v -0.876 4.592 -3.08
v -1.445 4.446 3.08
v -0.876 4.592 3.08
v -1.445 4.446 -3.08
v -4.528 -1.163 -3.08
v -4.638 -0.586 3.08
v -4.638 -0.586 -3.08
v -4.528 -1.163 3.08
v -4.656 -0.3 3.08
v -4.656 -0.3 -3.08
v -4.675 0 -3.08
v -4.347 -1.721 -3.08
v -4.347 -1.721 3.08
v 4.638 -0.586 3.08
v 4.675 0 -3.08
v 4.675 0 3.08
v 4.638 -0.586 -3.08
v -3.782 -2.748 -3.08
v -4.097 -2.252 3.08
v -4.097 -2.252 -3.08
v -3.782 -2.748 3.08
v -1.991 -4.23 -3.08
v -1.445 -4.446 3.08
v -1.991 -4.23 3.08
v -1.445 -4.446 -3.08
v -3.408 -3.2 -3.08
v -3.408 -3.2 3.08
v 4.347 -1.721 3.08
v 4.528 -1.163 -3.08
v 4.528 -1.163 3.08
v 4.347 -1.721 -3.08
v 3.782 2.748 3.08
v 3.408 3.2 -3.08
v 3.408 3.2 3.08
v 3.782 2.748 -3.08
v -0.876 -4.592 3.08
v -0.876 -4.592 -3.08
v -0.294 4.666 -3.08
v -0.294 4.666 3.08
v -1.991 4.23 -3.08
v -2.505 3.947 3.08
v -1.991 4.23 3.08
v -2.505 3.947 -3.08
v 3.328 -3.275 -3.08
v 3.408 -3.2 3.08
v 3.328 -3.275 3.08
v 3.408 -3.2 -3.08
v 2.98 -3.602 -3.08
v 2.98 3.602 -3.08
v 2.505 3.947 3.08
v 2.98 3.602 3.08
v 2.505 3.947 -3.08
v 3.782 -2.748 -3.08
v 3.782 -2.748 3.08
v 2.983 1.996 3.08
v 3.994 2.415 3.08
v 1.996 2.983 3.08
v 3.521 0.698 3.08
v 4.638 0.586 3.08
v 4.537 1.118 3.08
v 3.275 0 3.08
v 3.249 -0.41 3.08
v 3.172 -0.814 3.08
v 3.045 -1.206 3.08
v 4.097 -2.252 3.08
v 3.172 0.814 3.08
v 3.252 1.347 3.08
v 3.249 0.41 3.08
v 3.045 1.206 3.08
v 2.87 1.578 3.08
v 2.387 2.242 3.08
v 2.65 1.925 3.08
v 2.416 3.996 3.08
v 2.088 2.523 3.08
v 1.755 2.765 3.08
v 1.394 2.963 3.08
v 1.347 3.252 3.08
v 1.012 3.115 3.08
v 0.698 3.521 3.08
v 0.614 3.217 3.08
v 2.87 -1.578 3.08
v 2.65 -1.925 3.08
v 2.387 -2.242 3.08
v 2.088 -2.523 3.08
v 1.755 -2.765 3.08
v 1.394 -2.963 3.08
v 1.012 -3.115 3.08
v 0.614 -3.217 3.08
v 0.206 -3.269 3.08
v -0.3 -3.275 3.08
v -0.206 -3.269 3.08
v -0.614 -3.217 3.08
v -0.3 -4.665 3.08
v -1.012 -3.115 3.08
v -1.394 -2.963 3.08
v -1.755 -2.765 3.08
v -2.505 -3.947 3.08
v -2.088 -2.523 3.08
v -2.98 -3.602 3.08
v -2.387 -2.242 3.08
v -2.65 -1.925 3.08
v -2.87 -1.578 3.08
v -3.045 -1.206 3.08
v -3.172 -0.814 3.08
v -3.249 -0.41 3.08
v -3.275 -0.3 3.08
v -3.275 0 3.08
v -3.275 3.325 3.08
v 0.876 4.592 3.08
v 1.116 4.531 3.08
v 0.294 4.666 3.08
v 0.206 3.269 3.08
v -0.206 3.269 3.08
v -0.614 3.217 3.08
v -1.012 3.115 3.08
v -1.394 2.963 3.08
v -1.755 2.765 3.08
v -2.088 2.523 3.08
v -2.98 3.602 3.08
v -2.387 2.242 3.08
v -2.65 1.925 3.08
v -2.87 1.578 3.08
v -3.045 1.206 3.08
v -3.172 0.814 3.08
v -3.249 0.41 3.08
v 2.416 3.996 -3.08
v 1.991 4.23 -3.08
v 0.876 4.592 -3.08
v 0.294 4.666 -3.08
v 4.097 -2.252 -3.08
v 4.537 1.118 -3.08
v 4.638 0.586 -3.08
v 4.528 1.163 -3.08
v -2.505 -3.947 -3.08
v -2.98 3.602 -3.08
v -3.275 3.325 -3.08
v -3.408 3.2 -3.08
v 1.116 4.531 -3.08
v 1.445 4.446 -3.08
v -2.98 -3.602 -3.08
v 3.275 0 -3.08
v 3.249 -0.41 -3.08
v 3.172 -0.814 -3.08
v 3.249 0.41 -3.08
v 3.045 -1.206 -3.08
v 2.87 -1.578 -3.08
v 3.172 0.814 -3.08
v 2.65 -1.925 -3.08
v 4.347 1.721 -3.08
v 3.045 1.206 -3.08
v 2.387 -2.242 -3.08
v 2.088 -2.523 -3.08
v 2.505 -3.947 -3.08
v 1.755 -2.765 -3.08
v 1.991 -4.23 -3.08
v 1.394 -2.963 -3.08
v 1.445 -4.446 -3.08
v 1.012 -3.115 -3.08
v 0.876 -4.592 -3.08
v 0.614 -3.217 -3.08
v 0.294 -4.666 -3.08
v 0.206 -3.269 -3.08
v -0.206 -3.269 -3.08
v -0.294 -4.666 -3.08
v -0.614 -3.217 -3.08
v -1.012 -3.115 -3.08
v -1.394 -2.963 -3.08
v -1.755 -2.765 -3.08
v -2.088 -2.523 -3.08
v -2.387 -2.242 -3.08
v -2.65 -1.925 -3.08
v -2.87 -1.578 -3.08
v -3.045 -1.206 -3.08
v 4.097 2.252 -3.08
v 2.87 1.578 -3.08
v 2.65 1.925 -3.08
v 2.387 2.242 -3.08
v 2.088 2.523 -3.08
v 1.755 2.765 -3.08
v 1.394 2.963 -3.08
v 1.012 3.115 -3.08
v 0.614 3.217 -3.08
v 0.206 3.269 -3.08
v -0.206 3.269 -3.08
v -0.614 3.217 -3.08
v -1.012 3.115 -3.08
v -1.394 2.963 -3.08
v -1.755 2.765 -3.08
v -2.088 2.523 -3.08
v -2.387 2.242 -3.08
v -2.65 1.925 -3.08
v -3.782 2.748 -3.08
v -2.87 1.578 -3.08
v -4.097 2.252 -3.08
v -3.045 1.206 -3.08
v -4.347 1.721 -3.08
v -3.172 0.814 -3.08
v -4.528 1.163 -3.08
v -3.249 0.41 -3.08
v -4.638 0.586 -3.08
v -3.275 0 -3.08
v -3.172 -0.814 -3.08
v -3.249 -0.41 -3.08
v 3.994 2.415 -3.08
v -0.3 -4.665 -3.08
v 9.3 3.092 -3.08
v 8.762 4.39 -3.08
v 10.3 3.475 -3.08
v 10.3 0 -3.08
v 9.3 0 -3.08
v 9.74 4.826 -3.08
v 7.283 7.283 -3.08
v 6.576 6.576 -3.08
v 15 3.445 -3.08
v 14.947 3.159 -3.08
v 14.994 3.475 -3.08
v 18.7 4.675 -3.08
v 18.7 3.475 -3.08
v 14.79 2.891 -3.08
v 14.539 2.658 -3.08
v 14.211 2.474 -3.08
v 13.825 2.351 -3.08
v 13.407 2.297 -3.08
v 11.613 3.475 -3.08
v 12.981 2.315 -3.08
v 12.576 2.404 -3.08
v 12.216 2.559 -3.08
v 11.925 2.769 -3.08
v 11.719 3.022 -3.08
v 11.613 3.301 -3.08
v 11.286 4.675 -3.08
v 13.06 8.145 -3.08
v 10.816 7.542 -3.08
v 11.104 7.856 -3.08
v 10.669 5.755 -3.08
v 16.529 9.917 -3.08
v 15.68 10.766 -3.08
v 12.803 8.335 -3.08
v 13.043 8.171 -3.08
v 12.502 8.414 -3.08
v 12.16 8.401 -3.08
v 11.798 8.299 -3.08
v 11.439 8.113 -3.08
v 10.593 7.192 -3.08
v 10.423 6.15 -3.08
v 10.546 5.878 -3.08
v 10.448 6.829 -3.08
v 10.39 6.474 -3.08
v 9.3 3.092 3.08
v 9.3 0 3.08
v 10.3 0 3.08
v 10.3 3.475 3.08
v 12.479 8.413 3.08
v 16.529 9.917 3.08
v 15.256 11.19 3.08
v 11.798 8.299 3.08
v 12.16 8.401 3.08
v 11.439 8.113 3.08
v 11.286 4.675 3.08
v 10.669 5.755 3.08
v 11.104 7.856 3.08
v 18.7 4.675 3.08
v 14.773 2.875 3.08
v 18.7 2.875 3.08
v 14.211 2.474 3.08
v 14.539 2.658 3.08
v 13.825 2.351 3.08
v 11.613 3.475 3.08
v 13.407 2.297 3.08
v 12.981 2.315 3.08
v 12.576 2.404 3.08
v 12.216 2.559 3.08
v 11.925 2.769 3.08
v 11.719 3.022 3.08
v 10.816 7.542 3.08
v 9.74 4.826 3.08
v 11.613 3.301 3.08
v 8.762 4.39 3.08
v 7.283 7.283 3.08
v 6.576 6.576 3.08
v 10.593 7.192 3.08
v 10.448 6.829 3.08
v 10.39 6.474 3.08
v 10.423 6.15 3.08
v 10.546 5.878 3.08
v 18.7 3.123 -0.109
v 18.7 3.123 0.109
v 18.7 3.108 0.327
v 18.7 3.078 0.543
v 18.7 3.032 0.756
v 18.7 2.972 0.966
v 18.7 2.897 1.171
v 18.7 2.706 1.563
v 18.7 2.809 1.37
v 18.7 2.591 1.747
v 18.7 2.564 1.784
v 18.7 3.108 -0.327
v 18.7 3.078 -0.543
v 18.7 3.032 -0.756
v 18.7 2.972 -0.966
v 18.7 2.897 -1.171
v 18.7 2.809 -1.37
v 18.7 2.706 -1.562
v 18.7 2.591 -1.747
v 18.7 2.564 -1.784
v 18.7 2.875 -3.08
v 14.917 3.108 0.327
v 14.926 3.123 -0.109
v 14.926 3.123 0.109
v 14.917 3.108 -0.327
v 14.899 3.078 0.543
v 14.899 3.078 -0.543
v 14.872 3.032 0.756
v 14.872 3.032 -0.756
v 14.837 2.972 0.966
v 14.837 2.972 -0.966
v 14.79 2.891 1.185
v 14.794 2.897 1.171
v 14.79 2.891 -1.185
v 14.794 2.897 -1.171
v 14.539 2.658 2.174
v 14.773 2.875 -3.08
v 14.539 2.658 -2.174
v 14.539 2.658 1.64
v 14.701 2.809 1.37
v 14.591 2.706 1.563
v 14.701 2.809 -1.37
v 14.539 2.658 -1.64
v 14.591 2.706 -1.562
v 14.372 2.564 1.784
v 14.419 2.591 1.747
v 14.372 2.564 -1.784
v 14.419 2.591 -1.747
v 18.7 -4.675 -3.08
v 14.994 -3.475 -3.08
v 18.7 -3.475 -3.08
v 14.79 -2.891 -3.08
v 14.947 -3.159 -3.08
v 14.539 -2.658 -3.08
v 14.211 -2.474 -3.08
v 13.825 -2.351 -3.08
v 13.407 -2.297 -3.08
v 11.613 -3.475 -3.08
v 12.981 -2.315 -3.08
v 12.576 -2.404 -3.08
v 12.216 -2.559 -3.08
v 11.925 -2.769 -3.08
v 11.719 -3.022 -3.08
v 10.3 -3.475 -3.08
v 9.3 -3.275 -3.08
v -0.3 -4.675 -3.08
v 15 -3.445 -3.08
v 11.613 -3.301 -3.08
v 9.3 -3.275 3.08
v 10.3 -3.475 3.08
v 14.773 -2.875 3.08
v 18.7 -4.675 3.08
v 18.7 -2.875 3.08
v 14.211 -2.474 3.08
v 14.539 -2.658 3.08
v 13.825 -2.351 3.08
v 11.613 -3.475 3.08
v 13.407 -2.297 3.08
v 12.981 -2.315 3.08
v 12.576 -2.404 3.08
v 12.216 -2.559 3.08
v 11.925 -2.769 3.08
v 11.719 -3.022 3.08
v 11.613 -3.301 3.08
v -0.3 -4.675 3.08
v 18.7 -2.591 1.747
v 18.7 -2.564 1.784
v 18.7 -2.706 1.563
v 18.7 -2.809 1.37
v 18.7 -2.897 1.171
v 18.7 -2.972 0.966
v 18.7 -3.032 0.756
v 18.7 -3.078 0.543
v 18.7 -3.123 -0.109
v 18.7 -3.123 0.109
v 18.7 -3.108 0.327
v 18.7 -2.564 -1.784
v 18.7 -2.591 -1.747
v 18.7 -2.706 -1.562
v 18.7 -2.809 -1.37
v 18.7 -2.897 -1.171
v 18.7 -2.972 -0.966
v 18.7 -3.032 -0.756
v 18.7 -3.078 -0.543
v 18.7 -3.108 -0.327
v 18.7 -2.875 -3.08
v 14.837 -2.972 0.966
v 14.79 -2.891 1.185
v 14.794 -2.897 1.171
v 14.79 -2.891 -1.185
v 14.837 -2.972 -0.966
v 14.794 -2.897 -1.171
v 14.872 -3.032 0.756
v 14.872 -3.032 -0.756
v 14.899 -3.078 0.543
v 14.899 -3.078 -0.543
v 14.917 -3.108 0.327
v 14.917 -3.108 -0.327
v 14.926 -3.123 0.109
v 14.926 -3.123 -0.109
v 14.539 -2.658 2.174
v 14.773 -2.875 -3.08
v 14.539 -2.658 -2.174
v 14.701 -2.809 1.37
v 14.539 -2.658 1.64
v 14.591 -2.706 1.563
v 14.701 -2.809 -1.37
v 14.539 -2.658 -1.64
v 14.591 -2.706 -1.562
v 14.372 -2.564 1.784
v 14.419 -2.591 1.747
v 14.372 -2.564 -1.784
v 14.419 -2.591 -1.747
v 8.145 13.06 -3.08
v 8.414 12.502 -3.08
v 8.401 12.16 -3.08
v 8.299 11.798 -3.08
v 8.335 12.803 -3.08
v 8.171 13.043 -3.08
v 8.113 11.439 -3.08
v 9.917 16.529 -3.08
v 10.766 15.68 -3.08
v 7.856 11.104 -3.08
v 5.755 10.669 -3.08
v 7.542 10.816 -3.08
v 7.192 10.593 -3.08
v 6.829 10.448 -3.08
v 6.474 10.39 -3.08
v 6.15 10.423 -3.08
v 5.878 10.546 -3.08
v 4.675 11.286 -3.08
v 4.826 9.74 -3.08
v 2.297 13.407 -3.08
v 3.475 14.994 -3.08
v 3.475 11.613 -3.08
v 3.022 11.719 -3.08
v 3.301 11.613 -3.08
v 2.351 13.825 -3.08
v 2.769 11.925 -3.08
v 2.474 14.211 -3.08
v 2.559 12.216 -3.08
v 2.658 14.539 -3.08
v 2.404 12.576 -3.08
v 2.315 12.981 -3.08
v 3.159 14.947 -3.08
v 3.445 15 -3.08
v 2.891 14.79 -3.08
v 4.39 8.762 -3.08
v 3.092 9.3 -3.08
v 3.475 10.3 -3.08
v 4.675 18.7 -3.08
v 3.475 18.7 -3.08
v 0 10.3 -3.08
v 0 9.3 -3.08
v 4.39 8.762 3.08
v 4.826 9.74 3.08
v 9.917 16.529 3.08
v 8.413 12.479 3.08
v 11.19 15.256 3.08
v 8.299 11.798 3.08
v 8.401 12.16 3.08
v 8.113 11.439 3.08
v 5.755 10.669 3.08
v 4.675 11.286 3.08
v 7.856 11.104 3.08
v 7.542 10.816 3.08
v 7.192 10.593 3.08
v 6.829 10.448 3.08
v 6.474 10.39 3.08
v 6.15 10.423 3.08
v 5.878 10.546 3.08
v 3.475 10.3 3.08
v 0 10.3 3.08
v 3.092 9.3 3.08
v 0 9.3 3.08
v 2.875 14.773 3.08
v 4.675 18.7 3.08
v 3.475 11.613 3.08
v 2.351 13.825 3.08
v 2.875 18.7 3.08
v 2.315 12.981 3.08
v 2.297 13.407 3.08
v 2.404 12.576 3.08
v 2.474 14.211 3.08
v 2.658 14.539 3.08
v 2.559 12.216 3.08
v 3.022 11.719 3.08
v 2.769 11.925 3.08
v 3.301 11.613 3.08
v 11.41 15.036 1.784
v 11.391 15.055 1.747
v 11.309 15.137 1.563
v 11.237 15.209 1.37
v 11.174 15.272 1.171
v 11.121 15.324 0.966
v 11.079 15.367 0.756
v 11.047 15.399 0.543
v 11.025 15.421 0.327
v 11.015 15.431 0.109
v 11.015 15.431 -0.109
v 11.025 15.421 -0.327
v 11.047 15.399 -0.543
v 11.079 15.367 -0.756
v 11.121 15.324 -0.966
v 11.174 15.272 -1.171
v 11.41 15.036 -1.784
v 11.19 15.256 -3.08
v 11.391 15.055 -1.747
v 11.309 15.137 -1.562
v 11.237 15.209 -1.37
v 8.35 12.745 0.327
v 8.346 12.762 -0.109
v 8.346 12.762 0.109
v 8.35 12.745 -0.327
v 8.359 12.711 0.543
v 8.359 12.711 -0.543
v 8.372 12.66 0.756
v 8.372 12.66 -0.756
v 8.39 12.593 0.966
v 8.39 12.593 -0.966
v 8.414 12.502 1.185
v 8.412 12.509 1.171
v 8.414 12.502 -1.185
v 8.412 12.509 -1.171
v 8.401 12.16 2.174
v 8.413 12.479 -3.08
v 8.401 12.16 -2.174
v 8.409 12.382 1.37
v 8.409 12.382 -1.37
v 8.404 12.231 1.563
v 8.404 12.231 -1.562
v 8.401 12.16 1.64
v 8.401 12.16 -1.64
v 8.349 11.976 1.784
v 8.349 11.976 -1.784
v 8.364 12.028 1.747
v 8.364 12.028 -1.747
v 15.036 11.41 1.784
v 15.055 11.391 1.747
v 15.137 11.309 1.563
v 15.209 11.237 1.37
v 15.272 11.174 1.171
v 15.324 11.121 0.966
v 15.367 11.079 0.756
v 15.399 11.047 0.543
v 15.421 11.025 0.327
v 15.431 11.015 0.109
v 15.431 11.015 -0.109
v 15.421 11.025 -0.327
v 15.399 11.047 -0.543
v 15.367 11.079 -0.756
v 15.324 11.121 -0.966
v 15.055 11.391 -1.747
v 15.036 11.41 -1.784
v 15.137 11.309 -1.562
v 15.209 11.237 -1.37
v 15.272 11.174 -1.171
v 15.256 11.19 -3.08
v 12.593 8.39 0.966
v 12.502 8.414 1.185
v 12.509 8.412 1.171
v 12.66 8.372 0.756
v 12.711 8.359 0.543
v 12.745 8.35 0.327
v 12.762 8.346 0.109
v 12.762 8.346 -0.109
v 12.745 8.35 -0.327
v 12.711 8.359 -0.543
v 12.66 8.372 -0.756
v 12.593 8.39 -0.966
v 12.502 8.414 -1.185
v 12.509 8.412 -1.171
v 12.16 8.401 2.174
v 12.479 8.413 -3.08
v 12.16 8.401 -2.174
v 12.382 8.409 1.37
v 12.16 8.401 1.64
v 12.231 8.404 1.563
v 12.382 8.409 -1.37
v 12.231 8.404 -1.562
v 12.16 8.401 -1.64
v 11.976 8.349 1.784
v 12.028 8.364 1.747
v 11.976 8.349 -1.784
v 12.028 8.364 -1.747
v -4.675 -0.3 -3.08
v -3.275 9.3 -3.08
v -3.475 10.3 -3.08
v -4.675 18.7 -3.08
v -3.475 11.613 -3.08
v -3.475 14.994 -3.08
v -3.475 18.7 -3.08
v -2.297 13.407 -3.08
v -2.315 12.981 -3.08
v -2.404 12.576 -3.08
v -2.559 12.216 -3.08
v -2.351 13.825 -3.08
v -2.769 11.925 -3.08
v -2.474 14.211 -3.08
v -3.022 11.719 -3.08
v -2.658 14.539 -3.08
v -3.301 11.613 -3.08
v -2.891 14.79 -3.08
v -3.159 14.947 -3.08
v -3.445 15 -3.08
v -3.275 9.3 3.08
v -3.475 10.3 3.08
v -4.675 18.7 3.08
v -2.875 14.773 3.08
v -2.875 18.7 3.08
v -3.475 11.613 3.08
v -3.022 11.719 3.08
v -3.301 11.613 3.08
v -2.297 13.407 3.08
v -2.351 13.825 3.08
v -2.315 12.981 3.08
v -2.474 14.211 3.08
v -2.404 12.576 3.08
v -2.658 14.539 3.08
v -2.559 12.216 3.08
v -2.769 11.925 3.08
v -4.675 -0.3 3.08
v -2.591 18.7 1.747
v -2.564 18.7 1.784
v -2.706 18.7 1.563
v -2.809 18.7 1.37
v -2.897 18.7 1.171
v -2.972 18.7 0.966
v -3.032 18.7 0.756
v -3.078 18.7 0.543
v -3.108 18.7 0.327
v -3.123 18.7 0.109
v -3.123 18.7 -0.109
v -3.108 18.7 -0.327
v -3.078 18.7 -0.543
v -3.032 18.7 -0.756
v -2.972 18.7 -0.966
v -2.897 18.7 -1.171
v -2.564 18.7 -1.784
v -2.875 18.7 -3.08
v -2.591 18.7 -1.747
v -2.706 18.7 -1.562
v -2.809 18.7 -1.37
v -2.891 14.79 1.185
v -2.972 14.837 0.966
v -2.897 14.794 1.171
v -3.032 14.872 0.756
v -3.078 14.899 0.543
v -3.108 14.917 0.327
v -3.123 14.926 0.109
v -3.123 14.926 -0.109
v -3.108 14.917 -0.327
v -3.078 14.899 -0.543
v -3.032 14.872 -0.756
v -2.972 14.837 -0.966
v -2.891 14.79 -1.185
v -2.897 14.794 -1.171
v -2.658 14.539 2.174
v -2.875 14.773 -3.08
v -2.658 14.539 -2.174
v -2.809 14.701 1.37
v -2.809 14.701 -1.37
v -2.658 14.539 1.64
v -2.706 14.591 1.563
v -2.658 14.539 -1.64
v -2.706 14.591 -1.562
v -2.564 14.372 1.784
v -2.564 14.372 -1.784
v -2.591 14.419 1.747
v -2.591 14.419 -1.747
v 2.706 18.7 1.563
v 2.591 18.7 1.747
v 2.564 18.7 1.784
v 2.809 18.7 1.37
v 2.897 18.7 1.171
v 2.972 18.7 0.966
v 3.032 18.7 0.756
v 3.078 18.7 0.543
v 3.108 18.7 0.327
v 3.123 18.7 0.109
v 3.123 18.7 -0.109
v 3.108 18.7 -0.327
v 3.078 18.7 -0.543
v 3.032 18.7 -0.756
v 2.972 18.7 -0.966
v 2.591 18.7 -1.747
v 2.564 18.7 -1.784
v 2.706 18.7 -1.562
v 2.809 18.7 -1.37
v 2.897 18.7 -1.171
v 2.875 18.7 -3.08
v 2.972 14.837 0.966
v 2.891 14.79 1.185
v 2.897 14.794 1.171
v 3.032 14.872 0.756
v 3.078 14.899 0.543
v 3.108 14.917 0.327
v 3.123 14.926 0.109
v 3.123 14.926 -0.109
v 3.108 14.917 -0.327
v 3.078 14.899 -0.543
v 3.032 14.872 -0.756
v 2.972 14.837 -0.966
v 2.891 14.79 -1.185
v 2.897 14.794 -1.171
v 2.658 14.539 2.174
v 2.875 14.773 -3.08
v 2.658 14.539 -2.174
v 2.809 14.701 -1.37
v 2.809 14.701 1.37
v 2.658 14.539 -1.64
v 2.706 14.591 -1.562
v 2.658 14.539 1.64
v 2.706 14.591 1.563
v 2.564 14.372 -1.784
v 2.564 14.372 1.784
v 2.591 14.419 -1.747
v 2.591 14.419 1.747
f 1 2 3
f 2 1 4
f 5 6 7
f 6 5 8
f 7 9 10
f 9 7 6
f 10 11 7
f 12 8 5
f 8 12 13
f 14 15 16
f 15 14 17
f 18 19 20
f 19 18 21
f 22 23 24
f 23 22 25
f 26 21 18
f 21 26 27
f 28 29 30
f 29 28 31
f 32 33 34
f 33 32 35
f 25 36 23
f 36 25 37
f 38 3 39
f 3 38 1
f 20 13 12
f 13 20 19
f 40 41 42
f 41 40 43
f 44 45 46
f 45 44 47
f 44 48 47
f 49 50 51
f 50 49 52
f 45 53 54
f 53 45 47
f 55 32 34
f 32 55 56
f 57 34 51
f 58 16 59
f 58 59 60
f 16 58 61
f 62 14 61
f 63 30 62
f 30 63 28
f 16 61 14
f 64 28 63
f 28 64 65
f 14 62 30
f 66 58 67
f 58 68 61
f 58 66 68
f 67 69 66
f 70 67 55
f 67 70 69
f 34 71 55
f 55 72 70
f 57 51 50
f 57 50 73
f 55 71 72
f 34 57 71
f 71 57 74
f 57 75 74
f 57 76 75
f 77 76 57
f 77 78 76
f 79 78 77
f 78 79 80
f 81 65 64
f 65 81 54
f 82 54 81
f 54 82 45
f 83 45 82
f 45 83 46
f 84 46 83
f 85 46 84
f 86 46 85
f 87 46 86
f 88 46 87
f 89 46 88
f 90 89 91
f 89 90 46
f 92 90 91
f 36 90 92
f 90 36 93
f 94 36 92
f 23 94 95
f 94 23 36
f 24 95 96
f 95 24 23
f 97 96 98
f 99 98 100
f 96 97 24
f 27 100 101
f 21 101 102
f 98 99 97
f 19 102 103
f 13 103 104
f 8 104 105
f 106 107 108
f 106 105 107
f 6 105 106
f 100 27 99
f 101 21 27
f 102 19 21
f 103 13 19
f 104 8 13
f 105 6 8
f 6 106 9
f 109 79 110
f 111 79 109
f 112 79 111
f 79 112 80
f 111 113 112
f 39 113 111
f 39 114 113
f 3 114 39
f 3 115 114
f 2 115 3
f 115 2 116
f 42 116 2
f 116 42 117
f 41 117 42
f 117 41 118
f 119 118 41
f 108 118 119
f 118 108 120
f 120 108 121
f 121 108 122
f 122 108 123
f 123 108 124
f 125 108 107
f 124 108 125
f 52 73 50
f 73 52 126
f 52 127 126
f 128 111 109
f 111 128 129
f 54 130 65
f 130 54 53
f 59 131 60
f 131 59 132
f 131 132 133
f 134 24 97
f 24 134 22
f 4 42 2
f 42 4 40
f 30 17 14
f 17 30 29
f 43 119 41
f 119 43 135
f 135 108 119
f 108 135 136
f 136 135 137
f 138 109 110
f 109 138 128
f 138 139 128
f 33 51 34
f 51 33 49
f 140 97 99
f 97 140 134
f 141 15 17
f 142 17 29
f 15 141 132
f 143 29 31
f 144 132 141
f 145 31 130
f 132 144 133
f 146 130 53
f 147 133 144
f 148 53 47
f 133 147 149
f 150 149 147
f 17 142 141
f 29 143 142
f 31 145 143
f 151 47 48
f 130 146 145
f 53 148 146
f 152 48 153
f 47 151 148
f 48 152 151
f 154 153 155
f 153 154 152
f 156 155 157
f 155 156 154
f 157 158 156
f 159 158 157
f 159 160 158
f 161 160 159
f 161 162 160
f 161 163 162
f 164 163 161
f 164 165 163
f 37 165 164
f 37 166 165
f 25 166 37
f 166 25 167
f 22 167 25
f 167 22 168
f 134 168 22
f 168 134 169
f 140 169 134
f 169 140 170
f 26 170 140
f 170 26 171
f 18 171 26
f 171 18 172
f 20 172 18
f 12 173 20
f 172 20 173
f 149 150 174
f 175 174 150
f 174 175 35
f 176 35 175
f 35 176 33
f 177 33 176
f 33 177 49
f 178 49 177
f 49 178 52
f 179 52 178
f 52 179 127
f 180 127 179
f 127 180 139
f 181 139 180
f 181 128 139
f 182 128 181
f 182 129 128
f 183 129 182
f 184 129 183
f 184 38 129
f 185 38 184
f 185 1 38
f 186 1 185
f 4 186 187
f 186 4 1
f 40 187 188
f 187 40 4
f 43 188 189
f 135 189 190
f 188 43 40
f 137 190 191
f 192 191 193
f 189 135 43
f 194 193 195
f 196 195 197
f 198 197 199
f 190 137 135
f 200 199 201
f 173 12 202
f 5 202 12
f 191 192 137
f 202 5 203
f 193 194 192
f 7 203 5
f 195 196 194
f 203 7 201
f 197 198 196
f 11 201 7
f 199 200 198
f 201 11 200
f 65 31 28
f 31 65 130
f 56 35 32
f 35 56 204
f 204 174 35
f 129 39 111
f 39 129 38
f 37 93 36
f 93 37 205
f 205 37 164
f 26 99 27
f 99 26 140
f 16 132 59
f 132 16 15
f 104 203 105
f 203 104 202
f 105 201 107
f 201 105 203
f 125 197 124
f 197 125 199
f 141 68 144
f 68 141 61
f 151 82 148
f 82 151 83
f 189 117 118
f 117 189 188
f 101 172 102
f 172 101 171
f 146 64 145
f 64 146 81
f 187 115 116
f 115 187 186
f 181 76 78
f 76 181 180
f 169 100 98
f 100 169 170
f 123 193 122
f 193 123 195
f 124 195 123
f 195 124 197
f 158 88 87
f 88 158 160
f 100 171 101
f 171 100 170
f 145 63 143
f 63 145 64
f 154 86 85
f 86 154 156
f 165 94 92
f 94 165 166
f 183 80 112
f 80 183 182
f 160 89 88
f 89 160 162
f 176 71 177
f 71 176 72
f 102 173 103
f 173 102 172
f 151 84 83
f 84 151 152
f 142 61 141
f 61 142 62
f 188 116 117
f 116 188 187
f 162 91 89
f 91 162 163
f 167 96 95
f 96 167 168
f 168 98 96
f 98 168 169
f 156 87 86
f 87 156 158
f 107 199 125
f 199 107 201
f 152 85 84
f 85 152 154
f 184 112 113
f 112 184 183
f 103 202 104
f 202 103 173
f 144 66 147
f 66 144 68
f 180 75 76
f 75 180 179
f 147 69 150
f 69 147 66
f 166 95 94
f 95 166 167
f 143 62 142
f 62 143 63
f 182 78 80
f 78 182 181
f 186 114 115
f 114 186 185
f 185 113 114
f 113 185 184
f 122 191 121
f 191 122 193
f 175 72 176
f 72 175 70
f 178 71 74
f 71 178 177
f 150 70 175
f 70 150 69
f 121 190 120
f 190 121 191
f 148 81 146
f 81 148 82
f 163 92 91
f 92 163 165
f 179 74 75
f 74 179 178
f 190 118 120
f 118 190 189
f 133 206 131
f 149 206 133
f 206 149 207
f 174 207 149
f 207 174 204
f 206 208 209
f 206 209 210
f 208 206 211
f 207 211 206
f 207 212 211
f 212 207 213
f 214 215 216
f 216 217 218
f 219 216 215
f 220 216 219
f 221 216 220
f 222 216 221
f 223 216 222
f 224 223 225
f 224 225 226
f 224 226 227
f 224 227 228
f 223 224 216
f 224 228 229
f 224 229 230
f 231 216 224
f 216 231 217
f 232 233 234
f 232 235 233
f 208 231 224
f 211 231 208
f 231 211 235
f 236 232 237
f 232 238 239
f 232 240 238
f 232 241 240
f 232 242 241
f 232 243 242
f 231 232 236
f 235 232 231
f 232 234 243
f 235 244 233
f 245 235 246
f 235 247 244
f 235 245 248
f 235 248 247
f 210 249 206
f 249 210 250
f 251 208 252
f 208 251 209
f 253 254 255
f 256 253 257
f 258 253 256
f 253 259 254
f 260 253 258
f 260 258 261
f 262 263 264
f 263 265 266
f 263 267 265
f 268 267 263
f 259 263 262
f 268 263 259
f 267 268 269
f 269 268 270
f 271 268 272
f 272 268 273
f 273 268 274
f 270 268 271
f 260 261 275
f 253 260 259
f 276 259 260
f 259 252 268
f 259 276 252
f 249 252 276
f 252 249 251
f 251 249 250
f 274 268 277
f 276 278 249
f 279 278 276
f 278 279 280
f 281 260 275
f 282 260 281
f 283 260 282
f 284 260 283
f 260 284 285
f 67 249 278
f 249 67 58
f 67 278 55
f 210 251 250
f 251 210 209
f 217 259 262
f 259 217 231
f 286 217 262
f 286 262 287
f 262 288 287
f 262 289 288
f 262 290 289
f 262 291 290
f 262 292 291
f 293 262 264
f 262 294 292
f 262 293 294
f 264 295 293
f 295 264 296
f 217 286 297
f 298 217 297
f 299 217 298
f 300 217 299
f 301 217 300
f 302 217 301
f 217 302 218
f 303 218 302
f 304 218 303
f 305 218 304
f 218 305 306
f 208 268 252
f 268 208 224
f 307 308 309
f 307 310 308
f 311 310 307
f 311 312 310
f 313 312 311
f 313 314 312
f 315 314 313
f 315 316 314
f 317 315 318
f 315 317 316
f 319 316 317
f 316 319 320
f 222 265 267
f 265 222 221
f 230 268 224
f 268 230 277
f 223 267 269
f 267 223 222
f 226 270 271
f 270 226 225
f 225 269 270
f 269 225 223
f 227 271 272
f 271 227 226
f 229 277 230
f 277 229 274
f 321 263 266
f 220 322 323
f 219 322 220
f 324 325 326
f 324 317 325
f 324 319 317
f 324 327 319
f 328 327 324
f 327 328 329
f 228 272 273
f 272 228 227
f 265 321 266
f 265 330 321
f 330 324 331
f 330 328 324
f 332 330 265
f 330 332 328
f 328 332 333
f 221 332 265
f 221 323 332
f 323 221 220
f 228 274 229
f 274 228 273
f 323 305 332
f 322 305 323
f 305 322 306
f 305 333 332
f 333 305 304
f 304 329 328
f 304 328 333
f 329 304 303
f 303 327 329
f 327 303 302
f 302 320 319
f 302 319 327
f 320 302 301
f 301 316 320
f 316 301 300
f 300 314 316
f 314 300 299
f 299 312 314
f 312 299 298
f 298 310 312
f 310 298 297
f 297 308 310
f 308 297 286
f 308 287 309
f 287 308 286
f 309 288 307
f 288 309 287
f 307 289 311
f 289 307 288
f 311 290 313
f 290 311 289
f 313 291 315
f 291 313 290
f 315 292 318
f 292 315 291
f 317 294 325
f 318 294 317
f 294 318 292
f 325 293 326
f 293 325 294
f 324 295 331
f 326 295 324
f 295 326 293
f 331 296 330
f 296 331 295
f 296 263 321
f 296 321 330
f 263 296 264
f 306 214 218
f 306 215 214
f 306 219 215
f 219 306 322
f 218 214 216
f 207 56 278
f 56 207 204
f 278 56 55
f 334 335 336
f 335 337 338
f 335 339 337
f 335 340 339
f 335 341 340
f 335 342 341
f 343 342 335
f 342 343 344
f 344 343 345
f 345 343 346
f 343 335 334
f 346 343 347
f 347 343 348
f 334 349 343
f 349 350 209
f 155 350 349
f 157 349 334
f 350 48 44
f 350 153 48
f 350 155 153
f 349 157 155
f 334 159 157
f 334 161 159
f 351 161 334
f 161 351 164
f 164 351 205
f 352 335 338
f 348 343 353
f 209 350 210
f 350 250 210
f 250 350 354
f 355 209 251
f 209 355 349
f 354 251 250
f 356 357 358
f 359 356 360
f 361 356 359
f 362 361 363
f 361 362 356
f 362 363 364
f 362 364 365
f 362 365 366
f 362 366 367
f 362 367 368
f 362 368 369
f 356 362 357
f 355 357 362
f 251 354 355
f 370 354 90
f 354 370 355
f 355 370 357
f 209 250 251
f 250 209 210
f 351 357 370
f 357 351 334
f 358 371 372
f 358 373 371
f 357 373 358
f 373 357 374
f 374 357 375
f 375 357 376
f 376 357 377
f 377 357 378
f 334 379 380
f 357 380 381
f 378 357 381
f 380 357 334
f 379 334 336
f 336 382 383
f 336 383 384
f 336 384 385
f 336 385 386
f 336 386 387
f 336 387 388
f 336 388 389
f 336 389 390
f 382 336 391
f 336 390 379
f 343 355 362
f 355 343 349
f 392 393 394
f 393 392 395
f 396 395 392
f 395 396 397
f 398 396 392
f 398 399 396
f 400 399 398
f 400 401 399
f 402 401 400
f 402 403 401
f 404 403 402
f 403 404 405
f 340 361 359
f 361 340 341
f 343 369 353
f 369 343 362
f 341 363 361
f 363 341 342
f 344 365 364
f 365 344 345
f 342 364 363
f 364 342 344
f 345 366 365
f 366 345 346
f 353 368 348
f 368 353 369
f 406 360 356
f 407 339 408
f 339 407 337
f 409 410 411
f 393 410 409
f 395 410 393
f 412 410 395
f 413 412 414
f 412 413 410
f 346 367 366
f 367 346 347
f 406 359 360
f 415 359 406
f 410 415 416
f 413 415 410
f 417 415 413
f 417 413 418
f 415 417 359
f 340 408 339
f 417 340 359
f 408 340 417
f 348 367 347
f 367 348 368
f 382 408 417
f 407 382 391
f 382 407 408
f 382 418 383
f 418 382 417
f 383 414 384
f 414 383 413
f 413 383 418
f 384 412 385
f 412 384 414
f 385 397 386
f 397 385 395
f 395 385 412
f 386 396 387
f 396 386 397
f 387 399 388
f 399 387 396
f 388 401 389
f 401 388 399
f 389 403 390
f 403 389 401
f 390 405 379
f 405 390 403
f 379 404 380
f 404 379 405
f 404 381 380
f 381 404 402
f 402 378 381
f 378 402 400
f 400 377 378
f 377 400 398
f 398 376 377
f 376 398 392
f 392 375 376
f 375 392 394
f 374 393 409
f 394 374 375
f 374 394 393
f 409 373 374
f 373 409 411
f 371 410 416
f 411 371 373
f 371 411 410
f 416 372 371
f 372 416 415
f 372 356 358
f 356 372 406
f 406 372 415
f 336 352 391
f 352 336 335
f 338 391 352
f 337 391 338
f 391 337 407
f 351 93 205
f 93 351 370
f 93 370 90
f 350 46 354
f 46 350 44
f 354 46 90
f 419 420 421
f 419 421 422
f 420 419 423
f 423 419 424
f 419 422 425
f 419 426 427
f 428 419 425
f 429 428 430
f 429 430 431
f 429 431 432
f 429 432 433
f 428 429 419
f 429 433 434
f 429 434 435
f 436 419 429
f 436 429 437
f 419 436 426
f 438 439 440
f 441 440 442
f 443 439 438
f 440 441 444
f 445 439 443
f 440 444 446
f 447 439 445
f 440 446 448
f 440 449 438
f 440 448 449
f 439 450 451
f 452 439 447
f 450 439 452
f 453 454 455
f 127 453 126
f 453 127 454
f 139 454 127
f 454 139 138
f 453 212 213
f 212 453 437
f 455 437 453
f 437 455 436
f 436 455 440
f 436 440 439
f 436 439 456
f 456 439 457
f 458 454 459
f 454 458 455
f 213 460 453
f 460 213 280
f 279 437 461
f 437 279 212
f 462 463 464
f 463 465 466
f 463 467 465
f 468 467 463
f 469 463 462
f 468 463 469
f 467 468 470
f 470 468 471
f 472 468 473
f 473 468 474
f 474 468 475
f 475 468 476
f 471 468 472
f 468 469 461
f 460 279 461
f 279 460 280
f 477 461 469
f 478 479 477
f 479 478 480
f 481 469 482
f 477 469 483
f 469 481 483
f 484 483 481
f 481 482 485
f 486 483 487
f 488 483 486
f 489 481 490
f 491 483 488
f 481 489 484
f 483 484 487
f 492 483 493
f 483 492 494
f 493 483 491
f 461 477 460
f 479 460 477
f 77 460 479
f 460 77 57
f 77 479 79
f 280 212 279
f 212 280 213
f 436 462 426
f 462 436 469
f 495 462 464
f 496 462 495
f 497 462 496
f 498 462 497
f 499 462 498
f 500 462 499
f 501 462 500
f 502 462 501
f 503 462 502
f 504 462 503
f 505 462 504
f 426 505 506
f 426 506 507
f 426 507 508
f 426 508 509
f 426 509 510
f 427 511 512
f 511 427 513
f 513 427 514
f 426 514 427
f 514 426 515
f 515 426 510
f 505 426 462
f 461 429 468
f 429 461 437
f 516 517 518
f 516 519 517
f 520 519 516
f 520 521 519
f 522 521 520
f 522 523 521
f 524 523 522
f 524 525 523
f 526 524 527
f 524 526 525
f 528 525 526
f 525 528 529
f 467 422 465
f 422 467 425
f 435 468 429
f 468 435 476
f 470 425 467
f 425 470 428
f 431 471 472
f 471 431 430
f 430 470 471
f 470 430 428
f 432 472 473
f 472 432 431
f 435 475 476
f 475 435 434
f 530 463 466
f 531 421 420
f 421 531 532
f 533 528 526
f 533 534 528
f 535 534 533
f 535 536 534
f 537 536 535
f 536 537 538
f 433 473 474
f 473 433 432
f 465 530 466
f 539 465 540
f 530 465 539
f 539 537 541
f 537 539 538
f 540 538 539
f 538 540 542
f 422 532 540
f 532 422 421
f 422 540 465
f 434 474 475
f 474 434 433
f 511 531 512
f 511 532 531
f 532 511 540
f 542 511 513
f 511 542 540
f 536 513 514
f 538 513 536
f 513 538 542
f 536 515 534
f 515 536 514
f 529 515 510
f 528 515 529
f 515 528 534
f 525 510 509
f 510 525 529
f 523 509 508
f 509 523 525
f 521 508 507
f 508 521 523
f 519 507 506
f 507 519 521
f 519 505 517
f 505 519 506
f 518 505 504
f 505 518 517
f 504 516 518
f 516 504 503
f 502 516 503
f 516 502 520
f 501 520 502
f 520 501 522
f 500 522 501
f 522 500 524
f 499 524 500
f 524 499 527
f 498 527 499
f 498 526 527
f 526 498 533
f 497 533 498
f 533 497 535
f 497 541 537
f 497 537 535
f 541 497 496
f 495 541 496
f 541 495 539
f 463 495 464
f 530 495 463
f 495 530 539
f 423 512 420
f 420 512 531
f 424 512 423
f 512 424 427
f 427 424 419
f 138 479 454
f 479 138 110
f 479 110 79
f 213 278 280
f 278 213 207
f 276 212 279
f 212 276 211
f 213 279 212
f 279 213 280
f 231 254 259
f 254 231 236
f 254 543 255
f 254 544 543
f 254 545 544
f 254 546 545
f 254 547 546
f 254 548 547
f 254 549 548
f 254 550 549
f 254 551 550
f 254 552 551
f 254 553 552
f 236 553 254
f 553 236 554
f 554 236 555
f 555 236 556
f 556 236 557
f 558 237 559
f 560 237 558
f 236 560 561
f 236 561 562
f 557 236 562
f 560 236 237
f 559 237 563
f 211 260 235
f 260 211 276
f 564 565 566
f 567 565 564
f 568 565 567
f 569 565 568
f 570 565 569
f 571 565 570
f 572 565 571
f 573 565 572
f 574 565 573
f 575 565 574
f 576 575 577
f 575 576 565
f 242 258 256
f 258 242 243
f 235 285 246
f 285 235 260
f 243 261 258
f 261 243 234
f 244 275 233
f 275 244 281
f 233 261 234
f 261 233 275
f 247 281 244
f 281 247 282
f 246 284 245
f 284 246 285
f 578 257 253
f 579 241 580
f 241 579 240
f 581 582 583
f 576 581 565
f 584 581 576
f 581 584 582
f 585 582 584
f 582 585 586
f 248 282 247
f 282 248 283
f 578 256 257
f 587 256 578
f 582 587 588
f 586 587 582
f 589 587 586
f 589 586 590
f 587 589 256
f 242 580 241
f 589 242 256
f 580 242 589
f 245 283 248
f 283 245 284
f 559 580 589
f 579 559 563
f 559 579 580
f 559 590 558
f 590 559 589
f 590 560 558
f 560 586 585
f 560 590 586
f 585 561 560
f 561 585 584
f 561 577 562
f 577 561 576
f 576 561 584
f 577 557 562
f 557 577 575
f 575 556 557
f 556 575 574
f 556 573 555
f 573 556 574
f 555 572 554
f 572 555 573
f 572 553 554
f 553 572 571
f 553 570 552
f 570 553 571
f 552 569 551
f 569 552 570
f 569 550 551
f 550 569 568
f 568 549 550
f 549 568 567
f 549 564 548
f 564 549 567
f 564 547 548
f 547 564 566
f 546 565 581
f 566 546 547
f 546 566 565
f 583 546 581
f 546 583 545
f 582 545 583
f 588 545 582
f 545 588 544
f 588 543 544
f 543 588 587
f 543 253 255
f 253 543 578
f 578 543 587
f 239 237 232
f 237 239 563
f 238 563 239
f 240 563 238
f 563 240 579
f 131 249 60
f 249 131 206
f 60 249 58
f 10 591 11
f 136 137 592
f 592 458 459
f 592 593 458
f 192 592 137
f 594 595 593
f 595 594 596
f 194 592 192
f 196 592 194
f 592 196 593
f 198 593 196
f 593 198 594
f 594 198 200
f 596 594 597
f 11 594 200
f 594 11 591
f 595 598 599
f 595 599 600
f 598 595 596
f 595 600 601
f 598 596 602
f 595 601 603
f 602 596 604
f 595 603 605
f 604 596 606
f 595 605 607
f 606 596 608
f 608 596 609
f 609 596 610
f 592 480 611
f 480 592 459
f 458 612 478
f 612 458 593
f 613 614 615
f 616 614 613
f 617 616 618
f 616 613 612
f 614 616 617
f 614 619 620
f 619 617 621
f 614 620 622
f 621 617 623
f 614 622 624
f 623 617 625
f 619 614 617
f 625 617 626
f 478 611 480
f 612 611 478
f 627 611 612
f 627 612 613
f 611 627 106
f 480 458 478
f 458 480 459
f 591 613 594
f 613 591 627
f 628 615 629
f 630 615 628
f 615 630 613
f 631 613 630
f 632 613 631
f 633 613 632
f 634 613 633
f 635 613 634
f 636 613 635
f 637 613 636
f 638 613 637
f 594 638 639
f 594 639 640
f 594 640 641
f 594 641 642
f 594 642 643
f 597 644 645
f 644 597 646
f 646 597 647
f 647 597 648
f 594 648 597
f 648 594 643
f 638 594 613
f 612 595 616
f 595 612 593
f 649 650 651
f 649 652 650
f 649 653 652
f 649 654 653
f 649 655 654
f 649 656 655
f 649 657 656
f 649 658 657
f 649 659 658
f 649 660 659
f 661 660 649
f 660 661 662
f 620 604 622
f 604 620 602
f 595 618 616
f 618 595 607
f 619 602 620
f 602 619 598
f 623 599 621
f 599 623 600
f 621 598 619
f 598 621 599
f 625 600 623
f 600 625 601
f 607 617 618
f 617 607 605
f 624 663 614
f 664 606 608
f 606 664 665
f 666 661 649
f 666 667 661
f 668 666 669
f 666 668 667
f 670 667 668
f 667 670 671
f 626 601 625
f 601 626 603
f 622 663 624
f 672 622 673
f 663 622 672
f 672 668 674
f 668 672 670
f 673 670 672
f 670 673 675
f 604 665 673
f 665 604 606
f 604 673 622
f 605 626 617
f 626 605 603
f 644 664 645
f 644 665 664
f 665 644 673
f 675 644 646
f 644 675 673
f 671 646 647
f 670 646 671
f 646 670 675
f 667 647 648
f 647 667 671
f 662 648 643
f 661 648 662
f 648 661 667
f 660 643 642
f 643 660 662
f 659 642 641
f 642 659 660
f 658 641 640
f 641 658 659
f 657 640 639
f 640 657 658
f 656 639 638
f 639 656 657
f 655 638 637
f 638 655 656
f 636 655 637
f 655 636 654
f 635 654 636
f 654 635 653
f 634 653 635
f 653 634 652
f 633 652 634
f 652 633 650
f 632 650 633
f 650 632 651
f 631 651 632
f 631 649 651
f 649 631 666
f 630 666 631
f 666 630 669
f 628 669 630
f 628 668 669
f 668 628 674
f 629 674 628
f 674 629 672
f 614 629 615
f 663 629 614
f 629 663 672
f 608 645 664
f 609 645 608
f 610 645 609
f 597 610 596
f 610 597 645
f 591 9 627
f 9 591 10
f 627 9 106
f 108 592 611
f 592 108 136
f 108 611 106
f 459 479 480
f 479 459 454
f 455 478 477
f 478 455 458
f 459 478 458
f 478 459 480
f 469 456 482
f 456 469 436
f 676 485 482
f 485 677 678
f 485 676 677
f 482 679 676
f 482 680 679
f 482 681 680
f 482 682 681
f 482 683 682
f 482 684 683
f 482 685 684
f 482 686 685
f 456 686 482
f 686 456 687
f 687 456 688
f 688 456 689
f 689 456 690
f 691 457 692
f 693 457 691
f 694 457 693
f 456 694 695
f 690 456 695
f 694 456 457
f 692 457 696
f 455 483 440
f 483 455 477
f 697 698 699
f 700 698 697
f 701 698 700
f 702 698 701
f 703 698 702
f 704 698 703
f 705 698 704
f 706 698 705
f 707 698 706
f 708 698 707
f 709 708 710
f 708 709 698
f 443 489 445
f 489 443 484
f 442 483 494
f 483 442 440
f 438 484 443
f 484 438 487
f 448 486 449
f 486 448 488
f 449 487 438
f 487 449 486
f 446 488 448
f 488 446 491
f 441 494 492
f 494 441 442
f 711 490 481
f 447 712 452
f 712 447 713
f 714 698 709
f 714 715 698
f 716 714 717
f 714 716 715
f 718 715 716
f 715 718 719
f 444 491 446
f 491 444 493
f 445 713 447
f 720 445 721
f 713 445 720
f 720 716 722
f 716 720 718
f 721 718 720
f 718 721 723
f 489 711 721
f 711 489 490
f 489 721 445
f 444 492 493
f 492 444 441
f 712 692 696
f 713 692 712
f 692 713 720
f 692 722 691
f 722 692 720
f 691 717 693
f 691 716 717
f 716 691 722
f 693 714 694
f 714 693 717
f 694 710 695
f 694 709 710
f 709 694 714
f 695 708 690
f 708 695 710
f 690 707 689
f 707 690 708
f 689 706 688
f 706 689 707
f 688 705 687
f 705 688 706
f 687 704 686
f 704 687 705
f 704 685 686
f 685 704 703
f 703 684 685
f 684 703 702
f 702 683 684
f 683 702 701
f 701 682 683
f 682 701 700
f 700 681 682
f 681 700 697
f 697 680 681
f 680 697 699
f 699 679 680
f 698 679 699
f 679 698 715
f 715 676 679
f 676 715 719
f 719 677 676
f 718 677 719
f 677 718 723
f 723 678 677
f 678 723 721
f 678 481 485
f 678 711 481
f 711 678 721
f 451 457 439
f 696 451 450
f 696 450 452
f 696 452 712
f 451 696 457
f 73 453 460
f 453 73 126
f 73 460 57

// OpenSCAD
// file: lib/knex_lib.scad
// K'Nex Parts Library — shared modules for all part SCADs
// Geometry derived from https://www.printables.com/model/143840-knex-parts-customizable
// Measurements in millimeters (digital calipers)

knexDiameter = 6.25;

// --- Rod modules ---

module RodEnd(height) {
    difference() {
        cylinder(h=height, d=knexDiameter, $fn=50);
        // Snap groove near the tip
        translate([0, 0, height - 3.1])
        scale([1, 1, 1.93])
        rotate_extrude(convexity=10, $fn=30)
        translate([3.125, 0, 0])
        scale([1, 1, 0])
        circle(r=0.905, $fn=20);
    }
}

module RodCenter(length) {
    // Cross-shaped center section (+ profile)
    intersection() {
        cylinder(h=length, d=knexDiameter, $fn=50);
        union() {
            translate([-.95, -knexDiameter/2, 0])
            cube([1.9, knexDiameter + 1, length]);
            translate([-knexDiameter/2, -.95, 0])
            cube([knexDiameter + 1, 1.9, length]);
        }
    }
}

module fullRod(endHeight, centerLength) {
    // Builds along Z: from -endHeight to centerLength+endHeight
    translate([0, 0, centerLength])
    RodEnd(endHeight);
    RodCenter(centerLength);
    mirror([0, 0, 1])
    RodEnd(endHeight);
}

module fullRod2(externalLength, internalLength) {
    // Convenience: specify overall and center-section lengths
    fullRod((externalLength - internalLength) / 2, internalLength);
}

// --- Connector modules ---

module ConnectorCenter(height, width) {
    difference() {
        cylinder(h=height, d=6.55 + width * 2, $fn=50);
        translate([0, 0, -0.5])
        cylinder(h=height + 1, d=6.55, $fn=50);
    }
}

module ConnectorEndpt(i, c, a, j) {
    union() {
        translate([0, 0, 9.4 - 1])
        cube([6.16, 9.35/2, 1]);
        cube([6.16, 1.2, 9.4]);
        translate([6.16/2, 1.23, 6.16 - 3.8/5])
        scale([1, 2.3, 3.4])
        rotate([0, 90, 0])
        cylinder(d=1, h=6.16, $fn=25, center=true);
        linear_extrude(height=6)
        difference() {
            polygon(points=[
                [0, 0], [6.16, 0], [6.16, 1.8],
                [6.16 - 1.46, 2.15], [1.46, 2.15], [0, 1.8]
            ]);
            translate([6.16/2, 9.35/2, 0])
            circle(d=6.25, $fn=90);
        }
    }
    if (i > 0) {
        if ((((i == c && j == 1) || (i == 1 && j == 2)) && c < 8) || a - 360 > 80) {
            // Straight locking tab (for end arms or wide-angle connectors)
            translate([0, 0, 9])
            cube([6.16, 1.4, 10]);
        }
        else {
            // Angled locking tab (for tight-angle connectors)
            translate([0, 0, 9.25])
            rotate([-45/2])
            cube([6.16, 1.4, 7]);
        }
    }
}

module ConnectorEnd(i=0, c=0, a=45) {
    translate([0, -9.35/2, 6.16])
    rotate([0, 90, 0])
    union() {
        ConnectorEndpt(i, c, a, 1);
        translate([0, 9.35, 0])
        mirror([0, 1, 0])
        ConnectorEndpt(i, c, a, 2);
    }
}

// Arm offset from center to ConnectorEnd origin
_arm_offset = -(23.15 - (6.5 + 1.4) / 2) + 0.5;

module Connector(c, a=45) {
    // c = number of arms, a = angle parameter (use 360+spacing for proper tab logic)
    // Effective arm spacing = a mod 360
    union() {
        ConnectorCenter(6.16, 1.4);
        for (i = [1:c]) {
            rotate([0, 0, (i-1) * a])
            translate([_arm_offset, 0, 0])
            ConnectorEnd(i, c, a);
        }
    }
}
// main file
// K'NEX Red 3-Way 90° Connector
// Three arms at 0°, 45°, and 90° (45° arm spacing)
include <lib/knex_lib.scad>
$fn = 72;

translate([0, 0, -6.16/2])
rotate([0, 0, 180])
Connector(3, 405);
